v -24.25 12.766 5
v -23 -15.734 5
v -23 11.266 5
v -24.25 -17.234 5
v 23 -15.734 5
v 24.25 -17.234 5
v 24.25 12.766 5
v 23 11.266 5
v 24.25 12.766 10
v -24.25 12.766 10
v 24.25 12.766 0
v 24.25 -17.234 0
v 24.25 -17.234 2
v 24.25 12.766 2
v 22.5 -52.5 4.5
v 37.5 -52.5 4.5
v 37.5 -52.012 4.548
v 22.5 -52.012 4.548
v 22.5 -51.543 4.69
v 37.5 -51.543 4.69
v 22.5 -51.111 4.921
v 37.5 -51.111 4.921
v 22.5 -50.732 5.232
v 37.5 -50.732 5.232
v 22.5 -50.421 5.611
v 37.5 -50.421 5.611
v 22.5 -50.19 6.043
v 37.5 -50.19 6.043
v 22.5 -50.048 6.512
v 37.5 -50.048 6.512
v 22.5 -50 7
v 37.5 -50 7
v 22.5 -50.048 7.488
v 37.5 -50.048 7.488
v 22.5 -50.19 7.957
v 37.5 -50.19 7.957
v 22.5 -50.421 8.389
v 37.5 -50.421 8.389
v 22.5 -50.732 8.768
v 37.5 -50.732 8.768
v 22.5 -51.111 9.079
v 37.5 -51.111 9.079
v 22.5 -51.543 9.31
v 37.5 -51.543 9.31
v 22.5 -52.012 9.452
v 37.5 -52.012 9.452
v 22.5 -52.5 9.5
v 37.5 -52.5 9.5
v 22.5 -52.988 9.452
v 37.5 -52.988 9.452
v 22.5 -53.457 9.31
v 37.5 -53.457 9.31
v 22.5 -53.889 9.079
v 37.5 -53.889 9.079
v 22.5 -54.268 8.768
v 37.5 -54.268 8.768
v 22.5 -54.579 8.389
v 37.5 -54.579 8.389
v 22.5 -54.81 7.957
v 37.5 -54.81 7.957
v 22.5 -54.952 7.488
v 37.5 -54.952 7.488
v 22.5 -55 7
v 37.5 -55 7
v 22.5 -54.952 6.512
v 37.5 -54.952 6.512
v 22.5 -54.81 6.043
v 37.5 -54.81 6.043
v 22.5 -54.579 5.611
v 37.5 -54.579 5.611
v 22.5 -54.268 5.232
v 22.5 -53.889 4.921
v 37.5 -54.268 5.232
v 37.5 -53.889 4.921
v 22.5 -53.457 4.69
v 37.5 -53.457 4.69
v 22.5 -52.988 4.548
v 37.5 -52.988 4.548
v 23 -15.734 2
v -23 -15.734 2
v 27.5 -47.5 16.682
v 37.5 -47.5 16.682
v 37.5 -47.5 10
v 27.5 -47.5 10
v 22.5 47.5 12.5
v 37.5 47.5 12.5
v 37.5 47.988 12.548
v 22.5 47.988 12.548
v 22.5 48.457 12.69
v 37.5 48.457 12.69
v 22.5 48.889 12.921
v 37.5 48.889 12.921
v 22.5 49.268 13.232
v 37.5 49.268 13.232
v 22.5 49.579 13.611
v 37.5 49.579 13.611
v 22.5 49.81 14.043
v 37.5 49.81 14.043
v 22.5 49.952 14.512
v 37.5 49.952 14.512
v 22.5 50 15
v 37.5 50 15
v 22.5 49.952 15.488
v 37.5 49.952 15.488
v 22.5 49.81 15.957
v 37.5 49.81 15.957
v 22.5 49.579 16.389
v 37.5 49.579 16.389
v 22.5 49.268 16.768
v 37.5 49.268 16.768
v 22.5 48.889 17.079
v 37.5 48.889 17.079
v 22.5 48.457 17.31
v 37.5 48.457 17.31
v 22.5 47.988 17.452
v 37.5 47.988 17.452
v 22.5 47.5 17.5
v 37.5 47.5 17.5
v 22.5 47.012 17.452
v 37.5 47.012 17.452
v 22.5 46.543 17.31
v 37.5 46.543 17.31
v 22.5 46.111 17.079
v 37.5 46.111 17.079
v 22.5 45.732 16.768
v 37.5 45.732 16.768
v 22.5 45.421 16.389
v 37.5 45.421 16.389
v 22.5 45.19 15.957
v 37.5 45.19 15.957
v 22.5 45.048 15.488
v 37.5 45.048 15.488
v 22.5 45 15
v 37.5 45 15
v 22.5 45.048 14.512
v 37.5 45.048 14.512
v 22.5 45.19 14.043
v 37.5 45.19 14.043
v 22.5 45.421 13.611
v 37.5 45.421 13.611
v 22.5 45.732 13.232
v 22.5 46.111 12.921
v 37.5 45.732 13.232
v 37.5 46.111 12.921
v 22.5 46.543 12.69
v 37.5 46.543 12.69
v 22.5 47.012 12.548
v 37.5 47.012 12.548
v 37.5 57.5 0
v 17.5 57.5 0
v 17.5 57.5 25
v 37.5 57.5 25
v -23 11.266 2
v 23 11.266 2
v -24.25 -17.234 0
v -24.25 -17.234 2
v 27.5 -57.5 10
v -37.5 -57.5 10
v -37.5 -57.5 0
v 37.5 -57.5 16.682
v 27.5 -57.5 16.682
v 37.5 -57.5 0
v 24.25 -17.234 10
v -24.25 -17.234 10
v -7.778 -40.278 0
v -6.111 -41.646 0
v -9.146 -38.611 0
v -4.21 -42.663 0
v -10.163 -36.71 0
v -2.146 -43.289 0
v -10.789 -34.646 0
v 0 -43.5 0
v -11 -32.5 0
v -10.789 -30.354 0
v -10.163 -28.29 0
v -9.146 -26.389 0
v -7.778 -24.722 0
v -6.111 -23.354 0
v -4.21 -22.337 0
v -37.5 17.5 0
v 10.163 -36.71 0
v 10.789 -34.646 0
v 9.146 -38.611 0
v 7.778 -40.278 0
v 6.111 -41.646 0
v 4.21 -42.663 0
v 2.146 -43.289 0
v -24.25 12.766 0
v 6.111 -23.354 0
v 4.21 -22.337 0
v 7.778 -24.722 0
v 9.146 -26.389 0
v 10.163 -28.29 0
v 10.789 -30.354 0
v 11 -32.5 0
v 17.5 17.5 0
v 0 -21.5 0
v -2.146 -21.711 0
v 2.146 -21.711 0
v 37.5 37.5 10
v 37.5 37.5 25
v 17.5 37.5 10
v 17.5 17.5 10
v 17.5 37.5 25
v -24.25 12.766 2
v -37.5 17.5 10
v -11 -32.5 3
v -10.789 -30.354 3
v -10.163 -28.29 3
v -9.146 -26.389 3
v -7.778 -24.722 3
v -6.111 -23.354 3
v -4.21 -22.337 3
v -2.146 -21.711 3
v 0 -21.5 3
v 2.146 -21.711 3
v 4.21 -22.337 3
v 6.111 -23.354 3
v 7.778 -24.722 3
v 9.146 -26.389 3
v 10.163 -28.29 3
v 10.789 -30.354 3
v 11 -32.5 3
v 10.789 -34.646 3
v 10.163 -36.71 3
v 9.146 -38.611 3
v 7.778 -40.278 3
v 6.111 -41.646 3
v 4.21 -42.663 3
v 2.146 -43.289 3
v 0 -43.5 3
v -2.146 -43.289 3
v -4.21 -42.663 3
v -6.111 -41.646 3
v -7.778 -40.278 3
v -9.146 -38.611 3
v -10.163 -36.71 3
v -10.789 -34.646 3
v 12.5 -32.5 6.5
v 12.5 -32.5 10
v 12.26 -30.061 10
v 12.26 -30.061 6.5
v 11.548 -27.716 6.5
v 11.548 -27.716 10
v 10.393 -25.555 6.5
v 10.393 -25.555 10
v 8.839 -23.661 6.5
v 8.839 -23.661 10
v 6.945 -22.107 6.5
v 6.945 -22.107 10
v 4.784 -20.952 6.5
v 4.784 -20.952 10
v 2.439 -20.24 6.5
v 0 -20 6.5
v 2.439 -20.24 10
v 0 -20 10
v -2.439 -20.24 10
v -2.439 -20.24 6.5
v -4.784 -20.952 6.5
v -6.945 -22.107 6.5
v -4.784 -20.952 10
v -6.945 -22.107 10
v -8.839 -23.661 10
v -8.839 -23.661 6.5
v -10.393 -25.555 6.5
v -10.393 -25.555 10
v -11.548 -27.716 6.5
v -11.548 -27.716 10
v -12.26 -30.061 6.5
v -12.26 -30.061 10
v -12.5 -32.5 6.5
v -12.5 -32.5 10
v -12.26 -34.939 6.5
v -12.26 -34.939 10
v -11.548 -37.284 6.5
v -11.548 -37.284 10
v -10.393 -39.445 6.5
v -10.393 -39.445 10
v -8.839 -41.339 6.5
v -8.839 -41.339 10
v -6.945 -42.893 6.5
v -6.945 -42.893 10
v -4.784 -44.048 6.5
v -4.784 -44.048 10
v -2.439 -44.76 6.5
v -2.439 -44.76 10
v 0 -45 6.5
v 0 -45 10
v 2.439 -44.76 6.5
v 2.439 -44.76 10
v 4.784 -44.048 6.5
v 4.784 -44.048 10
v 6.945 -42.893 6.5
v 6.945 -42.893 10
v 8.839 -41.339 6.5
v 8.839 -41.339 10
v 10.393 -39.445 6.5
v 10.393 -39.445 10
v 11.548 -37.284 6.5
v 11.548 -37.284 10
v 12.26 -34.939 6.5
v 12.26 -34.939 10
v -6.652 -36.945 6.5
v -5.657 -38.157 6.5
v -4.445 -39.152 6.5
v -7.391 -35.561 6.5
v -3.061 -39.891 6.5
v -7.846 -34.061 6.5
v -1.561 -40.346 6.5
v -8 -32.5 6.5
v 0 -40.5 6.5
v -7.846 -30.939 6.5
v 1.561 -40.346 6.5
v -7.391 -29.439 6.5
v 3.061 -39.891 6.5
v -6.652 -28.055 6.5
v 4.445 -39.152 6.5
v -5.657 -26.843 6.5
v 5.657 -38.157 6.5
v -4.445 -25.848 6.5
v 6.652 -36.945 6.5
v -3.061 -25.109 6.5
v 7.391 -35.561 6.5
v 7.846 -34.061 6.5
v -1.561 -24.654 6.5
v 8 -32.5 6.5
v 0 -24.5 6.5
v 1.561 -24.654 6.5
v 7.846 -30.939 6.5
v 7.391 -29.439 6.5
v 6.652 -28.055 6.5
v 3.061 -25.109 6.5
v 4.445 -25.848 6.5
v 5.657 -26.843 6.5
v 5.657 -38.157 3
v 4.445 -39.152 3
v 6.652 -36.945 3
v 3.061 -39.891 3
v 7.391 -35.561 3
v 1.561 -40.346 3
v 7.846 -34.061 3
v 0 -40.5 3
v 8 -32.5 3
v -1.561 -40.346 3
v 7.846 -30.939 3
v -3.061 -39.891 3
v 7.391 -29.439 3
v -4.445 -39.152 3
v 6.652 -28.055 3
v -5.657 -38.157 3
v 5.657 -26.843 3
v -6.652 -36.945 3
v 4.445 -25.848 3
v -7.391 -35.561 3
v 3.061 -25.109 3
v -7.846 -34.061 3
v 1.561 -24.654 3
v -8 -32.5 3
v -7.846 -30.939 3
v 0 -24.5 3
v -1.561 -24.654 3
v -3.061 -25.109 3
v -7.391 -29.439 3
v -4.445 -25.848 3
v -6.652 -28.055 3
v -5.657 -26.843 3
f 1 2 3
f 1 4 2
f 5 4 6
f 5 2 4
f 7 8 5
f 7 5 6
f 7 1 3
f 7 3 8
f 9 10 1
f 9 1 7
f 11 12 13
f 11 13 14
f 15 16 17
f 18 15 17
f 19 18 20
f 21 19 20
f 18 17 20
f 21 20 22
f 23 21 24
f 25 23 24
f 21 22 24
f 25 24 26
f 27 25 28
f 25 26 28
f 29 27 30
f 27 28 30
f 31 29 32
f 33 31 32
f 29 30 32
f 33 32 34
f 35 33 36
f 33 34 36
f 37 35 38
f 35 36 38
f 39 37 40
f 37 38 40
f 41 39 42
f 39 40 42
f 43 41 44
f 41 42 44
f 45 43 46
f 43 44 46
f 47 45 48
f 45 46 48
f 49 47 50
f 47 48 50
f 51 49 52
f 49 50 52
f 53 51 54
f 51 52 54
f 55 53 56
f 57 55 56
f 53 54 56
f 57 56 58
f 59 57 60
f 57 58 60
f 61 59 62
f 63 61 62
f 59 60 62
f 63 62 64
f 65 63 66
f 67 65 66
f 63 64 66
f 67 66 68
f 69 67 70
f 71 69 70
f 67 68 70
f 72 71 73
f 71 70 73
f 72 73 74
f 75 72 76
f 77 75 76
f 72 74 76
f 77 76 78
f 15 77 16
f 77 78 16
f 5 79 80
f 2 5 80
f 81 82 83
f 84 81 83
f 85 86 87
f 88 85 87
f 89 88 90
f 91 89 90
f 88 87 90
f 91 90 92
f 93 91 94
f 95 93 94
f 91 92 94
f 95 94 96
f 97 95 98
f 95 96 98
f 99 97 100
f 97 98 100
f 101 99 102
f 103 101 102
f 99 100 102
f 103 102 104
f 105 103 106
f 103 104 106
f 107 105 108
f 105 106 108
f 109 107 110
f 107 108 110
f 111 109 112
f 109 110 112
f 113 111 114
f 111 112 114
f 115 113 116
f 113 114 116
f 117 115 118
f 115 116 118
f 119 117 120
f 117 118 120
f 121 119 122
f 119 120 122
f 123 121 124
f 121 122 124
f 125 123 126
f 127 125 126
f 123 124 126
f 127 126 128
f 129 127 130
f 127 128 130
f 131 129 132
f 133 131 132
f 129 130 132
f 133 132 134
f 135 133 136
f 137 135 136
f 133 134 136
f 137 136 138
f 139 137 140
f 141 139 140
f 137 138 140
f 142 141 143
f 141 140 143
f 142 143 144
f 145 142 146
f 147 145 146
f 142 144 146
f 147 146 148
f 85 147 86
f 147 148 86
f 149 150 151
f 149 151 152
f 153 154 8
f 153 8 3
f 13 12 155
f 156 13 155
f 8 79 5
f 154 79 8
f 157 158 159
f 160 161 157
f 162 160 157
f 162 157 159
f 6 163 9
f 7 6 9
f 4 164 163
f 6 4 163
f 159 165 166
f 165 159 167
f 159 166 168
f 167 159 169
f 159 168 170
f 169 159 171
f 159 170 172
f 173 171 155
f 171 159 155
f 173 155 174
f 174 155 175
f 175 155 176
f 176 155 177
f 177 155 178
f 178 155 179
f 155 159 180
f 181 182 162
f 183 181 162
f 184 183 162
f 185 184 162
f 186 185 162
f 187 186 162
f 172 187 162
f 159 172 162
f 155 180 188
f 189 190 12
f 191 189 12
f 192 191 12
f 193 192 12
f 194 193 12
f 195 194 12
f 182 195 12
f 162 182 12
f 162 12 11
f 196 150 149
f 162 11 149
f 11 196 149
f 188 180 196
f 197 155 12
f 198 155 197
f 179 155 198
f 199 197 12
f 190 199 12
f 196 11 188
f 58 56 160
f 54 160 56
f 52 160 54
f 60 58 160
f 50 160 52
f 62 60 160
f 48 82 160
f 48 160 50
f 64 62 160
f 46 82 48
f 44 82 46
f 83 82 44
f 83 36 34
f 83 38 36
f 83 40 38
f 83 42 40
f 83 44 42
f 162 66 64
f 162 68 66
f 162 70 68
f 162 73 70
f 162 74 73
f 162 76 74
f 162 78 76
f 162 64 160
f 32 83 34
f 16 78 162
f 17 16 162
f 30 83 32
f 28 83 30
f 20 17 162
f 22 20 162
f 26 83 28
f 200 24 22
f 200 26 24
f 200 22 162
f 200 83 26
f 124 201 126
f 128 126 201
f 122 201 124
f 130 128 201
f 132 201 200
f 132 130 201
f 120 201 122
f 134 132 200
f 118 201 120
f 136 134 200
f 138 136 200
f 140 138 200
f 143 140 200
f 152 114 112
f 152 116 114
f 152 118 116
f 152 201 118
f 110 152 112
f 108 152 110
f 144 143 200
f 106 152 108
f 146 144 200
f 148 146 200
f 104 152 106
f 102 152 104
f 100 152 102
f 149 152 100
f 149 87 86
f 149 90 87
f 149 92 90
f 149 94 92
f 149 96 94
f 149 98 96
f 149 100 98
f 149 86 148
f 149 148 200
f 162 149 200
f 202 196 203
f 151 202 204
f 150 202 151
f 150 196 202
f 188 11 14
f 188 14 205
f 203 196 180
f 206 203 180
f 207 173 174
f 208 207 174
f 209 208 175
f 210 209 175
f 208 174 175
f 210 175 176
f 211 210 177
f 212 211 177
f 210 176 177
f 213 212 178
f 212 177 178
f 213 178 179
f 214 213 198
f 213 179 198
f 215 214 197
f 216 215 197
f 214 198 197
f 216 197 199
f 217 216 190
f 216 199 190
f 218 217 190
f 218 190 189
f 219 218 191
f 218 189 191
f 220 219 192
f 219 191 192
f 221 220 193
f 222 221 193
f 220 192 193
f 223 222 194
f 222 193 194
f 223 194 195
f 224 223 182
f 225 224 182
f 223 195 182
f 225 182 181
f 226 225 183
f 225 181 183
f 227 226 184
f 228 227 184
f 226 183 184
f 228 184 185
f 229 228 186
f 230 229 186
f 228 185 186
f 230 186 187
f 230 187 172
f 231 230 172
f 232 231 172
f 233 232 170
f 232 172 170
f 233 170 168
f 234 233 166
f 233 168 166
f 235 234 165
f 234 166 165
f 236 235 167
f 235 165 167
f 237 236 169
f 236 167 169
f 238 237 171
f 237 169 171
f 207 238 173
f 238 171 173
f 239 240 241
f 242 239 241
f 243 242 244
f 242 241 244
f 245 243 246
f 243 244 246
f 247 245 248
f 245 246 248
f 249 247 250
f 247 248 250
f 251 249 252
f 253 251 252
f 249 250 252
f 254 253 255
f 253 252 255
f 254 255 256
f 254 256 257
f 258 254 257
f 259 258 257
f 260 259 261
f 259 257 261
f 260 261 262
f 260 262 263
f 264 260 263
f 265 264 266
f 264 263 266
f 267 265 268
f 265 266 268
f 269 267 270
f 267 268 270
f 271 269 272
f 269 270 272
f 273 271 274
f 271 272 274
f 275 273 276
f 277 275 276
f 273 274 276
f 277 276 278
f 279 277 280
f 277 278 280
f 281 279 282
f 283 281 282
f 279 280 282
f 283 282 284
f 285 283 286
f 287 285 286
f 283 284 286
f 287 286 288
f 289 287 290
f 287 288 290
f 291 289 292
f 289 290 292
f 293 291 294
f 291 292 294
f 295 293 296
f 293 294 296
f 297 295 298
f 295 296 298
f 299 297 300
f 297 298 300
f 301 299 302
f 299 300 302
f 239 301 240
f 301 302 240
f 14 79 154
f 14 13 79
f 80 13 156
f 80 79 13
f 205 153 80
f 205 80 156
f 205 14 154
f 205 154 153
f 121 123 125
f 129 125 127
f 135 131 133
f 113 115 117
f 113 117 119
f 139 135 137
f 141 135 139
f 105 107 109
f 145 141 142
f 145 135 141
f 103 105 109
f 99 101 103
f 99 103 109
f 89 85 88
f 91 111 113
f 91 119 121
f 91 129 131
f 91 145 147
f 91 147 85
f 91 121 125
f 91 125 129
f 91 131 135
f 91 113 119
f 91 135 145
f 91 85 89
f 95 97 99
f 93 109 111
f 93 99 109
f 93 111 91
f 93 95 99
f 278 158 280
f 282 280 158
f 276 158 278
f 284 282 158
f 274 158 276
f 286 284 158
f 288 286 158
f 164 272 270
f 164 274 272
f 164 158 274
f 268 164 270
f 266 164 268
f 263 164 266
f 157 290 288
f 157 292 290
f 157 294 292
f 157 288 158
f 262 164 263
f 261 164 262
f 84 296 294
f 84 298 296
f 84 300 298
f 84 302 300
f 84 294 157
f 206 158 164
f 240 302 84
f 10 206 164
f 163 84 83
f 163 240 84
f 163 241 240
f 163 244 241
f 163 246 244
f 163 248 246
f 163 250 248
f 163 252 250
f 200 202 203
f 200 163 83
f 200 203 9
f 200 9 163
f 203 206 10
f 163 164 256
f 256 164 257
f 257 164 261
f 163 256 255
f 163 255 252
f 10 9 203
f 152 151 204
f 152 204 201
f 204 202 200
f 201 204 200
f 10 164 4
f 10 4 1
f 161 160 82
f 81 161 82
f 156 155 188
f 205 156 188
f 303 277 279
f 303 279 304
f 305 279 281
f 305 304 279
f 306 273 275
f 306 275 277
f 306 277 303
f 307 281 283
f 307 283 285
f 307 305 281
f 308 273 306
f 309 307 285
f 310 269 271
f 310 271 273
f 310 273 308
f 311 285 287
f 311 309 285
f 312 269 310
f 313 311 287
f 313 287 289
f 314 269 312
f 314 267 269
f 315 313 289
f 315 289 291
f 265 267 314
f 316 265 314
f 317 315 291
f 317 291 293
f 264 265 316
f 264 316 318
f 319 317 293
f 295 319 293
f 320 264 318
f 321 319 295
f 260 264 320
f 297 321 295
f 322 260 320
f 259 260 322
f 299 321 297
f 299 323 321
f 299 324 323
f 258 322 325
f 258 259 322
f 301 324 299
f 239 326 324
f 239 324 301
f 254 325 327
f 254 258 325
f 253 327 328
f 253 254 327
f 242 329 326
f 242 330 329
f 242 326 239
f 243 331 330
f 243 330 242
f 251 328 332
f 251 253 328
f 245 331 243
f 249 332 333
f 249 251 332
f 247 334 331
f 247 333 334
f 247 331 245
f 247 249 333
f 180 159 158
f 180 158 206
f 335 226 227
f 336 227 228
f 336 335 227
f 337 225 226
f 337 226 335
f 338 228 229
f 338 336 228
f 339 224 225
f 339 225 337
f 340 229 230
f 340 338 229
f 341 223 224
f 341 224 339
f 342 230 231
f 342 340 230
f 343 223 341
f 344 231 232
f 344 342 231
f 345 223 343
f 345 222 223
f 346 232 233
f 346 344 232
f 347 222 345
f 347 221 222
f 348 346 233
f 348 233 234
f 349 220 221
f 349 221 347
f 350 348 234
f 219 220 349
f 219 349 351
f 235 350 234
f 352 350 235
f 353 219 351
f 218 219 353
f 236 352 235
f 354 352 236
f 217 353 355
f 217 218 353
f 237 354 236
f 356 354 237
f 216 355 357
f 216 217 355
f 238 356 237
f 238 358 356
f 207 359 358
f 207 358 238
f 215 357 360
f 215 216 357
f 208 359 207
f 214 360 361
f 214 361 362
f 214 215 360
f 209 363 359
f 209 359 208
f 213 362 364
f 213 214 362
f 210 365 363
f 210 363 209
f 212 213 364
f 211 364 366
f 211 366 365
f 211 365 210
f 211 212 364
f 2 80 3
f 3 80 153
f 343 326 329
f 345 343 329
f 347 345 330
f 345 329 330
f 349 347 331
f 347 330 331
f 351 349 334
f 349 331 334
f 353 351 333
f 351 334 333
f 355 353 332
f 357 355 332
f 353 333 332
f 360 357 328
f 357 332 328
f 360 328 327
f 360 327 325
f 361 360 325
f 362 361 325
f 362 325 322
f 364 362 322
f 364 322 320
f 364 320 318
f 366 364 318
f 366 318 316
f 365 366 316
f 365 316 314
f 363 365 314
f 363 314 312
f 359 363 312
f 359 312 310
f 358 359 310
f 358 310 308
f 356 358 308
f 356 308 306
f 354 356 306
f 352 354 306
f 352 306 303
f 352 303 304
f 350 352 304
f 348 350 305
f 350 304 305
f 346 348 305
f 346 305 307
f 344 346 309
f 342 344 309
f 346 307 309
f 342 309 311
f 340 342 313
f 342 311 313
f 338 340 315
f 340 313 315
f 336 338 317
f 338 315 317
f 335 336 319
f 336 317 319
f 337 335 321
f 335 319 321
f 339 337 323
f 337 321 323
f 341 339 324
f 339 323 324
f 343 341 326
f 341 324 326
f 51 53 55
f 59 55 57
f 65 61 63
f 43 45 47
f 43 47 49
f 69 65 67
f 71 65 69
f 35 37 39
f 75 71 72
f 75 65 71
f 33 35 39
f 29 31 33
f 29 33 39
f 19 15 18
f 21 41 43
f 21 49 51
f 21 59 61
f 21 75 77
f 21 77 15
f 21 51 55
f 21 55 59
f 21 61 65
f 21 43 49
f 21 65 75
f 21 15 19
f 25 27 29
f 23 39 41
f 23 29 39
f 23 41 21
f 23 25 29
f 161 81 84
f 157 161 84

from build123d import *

# Parameters (mm, degrees)
SKETCH_1_W                      = 75
SKETCH_1_H                      = 115
EXTRUDE_1_DEPTH                 = 10
CUT_EXTRUDE_1_REACH             = 71.372
SKETCH_2_R                      = 8
SKETCH_3_R                      = 12.5
CUT_EXTRUDE_2_DEPTH             = 3.5
SKETCH_4_R                      = 11
CUT_EXTRUDE_3_DEPTH             = 3
SKETCH_6_W                      = 20
SKETCH_6_H                      = 20
EXTRUDE_2_DEPTH                 = 15
SKETCH_7_W                      = 6.681785618
SKETCH_7_H                      = 10
EXTRUDE_3_DEPTH                 = 10
CUT_EXTRUDE_4_REACH             = 75.058
SKETCH_8_W                      = 55
SKETCH_8_H                      = 40
CUT_EXTRUDE_4_DIRECTION_2_DEPTH = 74.058195981
CUT_EXTRUDE_5_REACH             = 75.058
SKETCH_9_W                      = 46
SKETCH_9_H                      = 27
SKETCH_10_W                     = 48.5
SKETCH_10_H                     = 30
CUT_EXTRUDE_6_DEPTH             = 2
SKETCH_11_W                     = 48.5
SKETCH_11_H                     = 30
CUT_EXTRUDE_7_DEPTH             = 5
SKETCH_12_R                     = 2.5
CUT_EXTRUDE_8_DEPTH             = 15


with BuildPart() as part:
    # 草图1 → 凸台-拉伸1 (new body)
    with BuildSketch(Plane.XY):
        Rectangle(SKETCH_1_W, SKETCH_1_H)
    extrude(amount=EXTRUDE_1_DEPTH)

    # 草图2 → 切除-拉伸1 (cut, up to next)
    with BuildSketch(Plane.XY.offset(10), mode=Mode.PRIVATE) as cut_extrude_1_sk1:
        with Locations((0, -32.5)):
            Circle(SKETCH_2_R)
    cut_extrude_1_tool1 = extrude(cut_extrude_1_sk1.sketch, amount=-CUT_EXTRUDE_1_REACH, mode=Mode.PRIVATE) & part.part
    add(cut_extrude_1_tool1.solids().sort_by_distance((0, -32.5, 10))[0], mode=Mode.SUBTRACT)

    # 草图3 → 切除-拉伸2 (cut)
    with BuildSketch(Plane.XY.offset(10)):
        with Locations((0, -32.5)):
            Circle(SKETCH_3_R)
    extrude(amount=-CUT_EXTRUDE_2_DEPTH, mode=Mode.SUBTRACT)

    # 草图4 → 切除-拉伸3 (cut)
    with BuildSketch(Plane(origin=(0, 0, 0), x_dir=(-1, 0, 0), z_dir=(0, 0, -1))):
        with Locations((0, -32.5)):
            Circle(SKETCH_4_R)
    extrude(amount=-CUT_EXTRUDE_3_DEPTH, mode=Mode.SUBTRACT)

    # 草图6 → 凸台-拉伸2 (add)
    with BuildSketch(Plane.XY.offset(10)):
        with Locations((27.5, 47.5)):
            Rectangle(SKETCH_6_W, SKETCH_6_H)
    extrude(amount=EXTRUDE_2_DEPTH)

    # 草图7 → 凸台-拉伸3 (add)
    with BuildSketch(Plane(origin=(37.5, 0, 0), x_dir=(0, 0, -1), z_dir=(1, 0, 0))):
        with Locations((-13.340892809, -52.5)):
            Rectangle(SKETCH_7_W, SKETCH_7_H)
    extrude(amount=-EXTRUDE_3_DEPTH)

    # 草图8 → 切除-拉伸4 (cut, up to next)
    with BuildSketch(Plane(origin=(0, 0, 0), x_dir=(-1, 0, 0), z_dir=(0, 0, -1)), mode=Mode.PRIVATE) as cut_extrude_4_sk1:
        with Locations((10, 37.5)):
            Rectangle(SKETCH_8_W, SKETCH_8_H)
    cut_extrude_4_tool1 = extrude(cut_extrude_4_sk1.sketch, amount=-CUT_EXTRUDE_4_REACH, mode=Mode.PRIVATE) & part.part
    add(cut_extrude_4_tool1.solids().sort_by_distance((-10, 37.5, 0))[0], mode=Mode.SUBTRACT)

    # 草图8 → 切除-拉伸4 direction 2 (cut)
    with BuildSketch(Plane(origin=(0, 0, 0), x_dir=(-1, 0, 0), z_dir=(0, 0, -1))):
        with Locations((10, 37.5)):
            Rectangle(SKETCH_8_W, SKETCH_8_H)
    extrude(amount=CUT_EXTRUDE_4_DIRECTION_2_DEPTH, mode=Mode.SUBTRACT)

    # 草图9 → 切除-拉伸5 (cut, up to next)
    with BuildSketch(Plane(origin=(0, 0, 0), x_dir=(-1, 0, 0), z_dir=(0, 0, -1)), mode=Mode.PRIVATE) as cut_extrude_5_sk1:
        with Locations((0, -2.234079676)):
            Rectangle(SKETCH_9_W, SKETCH_9_H)
    cut_extrude_5_tool1 = extrude(cut_extrude_5_sk1.sketch, amount=-CUT_EXTRUDE_5_REACH, mode=Mode.PRIVATE) & part.part
    add(cut_extrude_5_tool1.solids().sort_by_distance((0, -2.23408, 0))[0], mode=Mode.SUBTRACT)

    # 草图10 → 切除-拉伸6 (cut)
    with BuildSketch(Plane(origin=(0, 0, 0), x_dir=(-1, 0, 0), z_dir=(0, 0, -1))):
        with Locations((0, -2.234079676)):
            Rectangle(SKETCH_10_W, SKETCH_10_H)
    extrude(amount=-CUT_EXTRUDE_6_DEPTH, mode=Mode.SUBTRACT)

    # 草图11 → 切除-拉伸7 (cut)
    with BuildSketch(Plane.XY.offset(10)):
        with Locations((0, -2.234079676)):
            Rectangle(SKETCH_11_W, SKETCH_11_H)
    extrude(amount=-CUT_EXTRUDE_7_DEPTH, mode=Mode.SUBTRACT)

    # 草图12 → 切除-拉伸8 (cut)
    with BuildSketch(Plane(origin=(37.5, 0, 0), x_dir=(0, 0, -1), z_dir=(1, 0, 0))):
        with Locations((-15, 47.5)):
            Circle(SKETCH_12_R)
        with Locations((-7, -52.5)):
            Circle(SKETCH_12_R)
    extrude(amount=-CUT_EXTRUDE_8_DEPTH, mode=Mode.SUBTRACT)


solid = part.part
